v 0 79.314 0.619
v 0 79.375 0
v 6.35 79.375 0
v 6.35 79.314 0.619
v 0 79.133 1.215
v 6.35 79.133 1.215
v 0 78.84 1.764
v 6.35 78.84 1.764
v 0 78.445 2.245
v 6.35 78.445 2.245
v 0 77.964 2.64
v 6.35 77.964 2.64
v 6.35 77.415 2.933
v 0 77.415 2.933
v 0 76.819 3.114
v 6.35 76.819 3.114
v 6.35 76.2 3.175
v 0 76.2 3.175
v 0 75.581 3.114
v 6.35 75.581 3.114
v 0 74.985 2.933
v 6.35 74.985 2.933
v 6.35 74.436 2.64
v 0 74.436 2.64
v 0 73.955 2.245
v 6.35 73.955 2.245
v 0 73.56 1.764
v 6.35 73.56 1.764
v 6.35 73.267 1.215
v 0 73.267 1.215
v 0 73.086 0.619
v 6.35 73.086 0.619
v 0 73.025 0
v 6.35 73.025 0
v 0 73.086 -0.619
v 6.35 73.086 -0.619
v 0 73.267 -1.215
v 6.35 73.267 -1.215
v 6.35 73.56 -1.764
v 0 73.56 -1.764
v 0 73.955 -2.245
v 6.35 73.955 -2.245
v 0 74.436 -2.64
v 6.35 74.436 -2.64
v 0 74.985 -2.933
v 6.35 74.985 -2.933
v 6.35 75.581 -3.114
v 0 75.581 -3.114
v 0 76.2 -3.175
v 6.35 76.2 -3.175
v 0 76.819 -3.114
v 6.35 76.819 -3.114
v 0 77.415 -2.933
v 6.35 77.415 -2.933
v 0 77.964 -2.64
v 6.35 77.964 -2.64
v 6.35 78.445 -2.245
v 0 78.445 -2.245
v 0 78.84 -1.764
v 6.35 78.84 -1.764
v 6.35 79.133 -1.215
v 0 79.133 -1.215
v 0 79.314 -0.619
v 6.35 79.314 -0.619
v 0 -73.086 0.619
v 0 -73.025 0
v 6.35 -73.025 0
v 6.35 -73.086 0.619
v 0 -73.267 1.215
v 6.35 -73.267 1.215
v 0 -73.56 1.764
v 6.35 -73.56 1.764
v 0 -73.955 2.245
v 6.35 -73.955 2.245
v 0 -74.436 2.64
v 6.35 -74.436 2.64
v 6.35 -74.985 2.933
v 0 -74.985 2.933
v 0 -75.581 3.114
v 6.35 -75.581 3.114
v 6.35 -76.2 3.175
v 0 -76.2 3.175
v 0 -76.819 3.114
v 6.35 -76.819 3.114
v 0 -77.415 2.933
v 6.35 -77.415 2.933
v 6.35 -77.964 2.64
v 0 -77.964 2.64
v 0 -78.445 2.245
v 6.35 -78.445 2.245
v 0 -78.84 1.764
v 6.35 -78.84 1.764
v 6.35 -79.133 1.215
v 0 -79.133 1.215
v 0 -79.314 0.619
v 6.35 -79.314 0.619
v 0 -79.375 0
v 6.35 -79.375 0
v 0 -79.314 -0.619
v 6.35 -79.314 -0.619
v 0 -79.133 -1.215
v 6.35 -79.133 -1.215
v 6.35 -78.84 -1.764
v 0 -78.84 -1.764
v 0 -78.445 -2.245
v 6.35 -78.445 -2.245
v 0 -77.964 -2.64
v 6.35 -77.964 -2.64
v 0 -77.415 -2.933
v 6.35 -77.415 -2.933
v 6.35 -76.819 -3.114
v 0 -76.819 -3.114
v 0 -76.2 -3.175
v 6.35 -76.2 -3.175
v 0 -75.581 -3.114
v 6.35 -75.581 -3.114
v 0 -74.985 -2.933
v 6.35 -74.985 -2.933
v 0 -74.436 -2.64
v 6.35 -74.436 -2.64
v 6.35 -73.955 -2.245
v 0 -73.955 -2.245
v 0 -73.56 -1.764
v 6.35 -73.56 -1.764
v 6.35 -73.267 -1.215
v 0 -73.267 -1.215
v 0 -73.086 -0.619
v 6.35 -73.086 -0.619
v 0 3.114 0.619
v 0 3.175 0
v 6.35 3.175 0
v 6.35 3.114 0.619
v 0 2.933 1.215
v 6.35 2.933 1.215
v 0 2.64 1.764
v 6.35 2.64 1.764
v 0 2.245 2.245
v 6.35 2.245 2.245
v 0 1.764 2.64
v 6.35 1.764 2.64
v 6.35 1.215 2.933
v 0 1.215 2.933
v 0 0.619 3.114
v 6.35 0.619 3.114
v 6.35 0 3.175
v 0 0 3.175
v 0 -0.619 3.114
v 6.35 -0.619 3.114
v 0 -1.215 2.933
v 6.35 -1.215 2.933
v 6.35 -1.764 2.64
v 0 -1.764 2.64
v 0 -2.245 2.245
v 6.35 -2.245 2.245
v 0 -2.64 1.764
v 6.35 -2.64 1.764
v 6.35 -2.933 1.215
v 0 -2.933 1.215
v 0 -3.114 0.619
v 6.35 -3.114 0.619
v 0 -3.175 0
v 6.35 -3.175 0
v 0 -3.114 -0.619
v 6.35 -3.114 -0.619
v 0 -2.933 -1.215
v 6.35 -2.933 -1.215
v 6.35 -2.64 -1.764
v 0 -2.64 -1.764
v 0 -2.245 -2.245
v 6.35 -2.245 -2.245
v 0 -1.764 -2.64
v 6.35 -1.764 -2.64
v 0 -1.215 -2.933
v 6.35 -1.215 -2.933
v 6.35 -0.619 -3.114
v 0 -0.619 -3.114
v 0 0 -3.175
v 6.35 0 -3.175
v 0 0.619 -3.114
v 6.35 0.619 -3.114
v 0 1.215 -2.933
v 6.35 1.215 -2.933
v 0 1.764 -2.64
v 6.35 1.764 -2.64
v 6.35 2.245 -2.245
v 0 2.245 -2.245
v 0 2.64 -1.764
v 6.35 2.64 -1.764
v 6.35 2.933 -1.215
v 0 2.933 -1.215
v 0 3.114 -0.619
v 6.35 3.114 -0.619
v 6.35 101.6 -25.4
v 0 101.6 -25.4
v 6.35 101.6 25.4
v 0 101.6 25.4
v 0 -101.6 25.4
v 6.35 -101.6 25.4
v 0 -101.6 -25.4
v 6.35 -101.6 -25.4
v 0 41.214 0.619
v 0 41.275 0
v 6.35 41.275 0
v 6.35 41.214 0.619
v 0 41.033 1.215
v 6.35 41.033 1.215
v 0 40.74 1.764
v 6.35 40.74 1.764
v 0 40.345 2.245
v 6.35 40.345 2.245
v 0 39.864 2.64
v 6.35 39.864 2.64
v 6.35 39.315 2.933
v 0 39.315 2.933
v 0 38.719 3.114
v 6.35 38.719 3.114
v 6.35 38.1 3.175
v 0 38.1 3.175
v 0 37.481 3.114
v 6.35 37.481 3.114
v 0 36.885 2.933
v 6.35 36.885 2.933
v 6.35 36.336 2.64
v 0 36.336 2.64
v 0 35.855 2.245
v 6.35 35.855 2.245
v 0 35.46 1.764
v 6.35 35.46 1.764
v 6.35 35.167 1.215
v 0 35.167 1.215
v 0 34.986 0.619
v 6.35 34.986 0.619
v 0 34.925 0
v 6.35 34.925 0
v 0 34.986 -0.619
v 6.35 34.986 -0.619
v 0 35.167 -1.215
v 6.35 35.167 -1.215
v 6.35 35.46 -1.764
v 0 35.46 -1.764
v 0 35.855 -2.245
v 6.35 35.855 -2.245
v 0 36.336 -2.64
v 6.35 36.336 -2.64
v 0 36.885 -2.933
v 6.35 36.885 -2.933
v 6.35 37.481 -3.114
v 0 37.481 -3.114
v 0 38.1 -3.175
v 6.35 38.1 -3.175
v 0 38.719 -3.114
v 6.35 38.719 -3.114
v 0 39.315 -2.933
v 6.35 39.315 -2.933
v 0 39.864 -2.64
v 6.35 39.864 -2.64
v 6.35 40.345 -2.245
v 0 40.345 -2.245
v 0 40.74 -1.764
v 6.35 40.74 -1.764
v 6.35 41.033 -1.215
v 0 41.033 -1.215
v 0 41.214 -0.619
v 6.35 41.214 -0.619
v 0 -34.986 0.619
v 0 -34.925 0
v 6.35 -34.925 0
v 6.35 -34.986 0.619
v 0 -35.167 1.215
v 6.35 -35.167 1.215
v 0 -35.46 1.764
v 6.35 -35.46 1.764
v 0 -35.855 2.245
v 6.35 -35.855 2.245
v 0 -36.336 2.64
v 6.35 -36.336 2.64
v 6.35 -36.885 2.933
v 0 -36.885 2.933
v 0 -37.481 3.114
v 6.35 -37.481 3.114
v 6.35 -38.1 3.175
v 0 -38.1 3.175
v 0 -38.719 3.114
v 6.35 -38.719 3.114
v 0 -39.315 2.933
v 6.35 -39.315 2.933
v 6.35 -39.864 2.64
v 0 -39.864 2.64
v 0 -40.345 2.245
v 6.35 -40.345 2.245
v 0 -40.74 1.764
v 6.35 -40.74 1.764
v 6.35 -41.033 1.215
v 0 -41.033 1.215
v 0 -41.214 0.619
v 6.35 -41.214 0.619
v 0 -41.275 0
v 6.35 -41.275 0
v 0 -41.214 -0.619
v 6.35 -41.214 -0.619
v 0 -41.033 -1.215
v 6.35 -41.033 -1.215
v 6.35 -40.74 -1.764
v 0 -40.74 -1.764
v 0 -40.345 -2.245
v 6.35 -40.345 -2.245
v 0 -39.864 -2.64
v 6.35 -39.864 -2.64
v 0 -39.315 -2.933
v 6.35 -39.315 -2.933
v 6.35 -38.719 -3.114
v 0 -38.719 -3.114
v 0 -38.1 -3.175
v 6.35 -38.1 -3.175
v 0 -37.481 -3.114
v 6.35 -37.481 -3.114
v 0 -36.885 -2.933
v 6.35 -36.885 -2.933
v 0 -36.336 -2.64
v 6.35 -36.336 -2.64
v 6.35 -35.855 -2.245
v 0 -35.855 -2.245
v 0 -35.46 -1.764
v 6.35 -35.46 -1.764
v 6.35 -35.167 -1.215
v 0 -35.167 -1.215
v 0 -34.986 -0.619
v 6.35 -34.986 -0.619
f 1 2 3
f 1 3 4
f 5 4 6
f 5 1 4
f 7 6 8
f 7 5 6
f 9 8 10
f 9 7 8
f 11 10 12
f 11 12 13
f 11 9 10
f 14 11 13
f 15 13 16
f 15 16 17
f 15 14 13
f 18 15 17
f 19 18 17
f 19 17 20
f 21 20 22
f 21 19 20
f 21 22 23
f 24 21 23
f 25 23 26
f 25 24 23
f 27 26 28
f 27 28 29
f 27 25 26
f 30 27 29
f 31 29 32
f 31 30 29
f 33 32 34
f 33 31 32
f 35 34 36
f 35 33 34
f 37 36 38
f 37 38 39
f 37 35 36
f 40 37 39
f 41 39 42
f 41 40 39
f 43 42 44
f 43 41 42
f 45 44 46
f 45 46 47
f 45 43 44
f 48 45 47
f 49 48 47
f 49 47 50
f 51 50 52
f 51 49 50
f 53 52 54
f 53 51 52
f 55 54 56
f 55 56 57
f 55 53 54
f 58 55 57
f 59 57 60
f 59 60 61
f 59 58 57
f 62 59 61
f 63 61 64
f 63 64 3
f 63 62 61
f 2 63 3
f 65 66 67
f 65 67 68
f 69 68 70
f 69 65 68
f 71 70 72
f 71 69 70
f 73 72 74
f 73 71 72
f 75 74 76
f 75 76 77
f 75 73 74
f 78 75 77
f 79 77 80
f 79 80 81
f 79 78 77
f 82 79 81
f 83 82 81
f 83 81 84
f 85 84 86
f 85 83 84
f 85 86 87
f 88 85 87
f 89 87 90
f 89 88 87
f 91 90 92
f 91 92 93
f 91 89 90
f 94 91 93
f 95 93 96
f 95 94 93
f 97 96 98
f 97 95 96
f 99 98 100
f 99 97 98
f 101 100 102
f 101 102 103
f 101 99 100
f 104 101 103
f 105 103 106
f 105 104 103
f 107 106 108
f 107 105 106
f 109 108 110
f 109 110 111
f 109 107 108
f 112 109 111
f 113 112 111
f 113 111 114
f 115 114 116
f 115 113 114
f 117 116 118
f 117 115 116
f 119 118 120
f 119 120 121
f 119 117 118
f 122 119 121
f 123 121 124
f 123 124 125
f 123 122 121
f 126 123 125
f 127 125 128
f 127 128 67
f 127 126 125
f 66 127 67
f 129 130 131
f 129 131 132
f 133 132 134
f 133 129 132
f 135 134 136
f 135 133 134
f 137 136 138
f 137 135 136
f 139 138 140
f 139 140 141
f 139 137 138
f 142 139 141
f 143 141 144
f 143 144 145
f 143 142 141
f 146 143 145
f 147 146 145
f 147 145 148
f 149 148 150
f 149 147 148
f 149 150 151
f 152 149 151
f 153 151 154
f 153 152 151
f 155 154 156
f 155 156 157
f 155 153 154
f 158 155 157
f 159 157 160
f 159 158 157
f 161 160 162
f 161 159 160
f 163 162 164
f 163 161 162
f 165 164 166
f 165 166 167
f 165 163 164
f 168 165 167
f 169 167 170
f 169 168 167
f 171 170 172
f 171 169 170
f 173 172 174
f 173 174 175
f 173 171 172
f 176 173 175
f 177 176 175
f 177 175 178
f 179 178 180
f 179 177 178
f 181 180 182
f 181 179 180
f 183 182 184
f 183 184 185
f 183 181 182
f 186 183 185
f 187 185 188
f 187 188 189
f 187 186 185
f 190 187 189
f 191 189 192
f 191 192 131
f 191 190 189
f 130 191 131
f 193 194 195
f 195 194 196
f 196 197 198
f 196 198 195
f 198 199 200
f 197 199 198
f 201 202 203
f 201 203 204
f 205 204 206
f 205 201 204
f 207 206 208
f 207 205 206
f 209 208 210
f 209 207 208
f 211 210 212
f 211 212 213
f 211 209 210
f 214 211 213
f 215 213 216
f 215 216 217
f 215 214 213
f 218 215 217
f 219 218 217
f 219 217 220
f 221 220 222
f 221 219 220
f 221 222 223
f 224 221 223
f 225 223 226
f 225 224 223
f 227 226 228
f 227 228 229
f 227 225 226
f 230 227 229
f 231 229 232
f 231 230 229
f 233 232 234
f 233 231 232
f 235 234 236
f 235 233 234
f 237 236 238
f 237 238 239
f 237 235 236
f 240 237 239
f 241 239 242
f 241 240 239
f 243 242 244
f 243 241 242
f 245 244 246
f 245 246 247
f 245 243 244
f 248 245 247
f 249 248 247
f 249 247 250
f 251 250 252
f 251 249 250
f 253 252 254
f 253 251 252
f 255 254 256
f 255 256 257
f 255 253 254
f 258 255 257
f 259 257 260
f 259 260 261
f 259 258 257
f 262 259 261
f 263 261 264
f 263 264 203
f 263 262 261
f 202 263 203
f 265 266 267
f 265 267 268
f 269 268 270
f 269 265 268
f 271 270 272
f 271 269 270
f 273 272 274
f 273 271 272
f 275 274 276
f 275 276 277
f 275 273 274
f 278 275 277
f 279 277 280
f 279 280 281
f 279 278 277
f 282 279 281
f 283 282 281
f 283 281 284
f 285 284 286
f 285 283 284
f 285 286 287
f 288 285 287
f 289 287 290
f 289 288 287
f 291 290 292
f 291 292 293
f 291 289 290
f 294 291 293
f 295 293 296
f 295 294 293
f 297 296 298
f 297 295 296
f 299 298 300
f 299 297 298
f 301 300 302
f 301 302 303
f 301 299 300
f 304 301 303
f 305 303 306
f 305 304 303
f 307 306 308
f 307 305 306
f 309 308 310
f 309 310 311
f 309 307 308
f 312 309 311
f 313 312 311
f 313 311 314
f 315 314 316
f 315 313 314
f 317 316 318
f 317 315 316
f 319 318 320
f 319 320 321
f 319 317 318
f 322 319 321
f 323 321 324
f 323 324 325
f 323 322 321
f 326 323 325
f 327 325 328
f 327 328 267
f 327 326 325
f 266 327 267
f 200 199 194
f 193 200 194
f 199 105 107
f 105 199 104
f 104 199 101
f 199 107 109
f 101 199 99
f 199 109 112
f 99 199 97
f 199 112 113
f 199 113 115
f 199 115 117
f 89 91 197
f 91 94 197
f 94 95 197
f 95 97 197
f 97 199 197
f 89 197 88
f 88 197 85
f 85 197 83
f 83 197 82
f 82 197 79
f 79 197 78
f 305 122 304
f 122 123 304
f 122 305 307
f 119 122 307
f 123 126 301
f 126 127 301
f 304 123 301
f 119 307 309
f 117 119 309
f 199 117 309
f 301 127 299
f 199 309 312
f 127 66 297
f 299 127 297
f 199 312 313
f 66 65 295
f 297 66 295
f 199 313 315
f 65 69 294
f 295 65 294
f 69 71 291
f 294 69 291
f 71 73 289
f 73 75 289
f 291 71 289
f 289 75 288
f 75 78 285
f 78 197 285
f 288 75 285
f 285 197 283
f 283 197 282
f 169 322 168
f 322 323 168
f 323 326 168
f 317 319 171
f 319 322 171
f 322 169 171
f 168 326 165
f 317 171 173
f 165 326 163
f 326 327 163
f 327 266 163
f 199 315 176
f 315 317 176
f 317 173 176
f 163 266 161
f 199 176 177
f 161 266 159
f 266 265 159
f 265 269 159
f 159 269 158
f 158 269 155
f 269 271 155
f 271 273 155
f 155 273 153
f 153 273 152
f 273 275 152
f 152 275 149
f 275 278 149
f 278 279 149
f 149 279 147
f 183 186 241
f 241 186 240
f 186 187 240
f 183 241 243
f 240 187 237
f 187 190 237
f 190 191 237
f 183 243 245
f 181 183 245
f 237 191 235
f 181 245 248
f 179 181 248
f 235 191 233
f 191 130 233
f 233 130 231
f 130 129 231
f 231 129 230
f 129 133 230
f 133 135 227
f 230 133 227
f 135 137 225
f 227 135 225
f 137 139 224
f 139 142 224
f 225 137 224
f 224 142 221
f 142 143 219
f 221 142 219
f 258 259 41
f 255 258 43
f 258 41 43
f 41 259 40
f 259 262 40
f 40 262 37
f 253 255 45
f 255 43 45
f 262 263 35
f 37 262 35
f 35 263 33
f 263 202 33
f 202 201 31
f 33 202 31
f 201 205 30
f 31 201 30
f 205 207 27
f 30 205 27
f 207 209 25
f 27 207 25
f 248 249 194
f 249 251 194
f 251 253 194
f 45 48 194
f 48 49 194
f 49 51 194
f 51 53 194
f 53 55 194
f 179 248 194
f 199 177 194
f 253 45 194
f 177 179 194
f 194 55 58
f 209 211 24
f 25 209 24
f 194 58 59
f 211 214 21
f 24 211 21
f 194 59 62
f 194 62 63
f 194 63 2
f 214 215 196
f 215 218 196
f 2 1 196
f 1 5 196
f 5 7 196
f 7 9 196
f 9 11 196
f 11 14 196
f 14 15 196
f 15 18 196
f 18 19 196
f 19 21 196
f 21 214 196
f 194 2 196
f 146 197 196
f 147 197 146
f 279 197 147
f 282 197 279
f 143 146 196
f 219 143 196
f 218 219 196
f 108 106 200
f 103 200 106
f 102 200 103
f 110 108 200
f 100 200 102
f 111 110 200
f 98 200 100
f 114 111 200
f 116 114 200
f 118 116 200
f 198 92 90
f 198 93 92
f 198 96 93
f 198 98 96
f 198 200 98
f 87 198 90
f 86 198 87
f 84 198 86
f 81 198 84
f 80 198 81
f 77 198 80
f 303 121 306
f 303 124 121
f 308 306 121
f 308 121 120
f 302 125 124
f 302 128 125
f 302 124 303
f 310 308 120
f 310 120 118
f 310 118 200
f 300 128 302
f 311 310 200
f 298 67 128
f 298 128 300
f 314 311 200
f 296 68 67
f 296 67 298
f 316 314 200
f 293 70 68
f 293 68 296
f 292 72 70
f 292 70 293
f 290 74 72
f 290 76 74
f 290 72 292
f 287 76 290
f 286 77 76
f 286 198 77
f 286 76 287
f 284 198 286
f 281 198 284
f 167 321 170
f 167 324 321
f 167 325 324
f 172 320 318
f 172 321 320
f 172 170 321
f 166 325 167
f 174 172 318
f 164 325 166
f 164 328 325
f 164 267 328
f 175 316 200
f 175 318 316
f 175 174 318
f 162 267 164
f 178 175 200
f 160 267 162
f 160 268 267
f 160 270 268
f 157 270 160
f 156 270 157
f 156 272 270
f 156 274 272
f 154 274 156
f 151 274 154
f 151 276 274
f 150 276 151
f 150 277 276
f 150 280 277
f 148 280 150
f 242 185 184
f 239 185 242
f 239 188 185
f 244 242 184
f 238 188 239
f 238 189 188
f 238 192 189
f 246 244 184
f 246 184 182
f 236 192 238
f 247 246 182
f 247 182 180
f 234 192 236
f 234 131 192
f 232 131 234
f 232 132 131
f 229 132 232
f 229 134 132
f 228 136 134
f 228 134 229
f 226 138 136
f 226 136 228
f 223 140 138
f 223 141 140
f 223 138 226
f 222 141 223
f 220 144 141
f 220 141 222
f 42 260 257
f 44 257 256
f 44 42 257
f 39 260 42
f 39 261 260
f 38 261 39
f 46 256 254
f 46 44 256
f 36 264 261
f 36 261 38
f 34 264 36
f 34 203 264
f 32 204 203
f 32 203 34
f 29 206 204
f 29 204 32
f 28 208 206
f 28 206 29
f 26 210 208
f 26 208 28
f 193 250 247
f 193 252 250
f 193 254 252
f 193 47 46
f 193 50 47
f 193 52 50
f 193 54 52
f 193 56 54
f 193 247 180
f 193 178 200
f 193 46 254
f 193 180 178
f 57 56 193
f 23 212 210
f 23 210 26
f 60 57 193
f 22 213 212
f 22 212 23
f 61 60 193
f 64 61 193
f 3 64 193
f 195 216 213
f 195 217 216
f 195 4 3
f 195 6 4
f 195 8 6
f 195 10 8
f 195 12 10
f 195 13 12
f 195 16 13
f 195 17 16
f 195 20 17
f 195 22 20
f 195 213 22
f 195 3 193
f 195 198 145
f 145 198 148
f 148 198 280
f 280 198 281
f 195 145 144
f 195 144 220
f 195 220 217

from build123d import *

# Parameters (mm, degrees)
F0_W     = 203.2
F0_H     = 50.8
F0_R     = 3.175
F1_DEPTH = 6.35


with BuildPart() as f1:
    # F0 (on Right) → F1 (new body)
    with BuildSketch(Plane.YZ):
        Rectangle(F0_W, F0_H)
        with Locations((-76.2, 0)):
            Circle(F0_R, mode=Mode.SUBTRACT)
        with Locations((-38.1, 0)):
            Circle(F0_R, mode=Mode.SUBTRACT)
        Circle(F0_R, mode=Mode.SUBTRACT)
        with Locations((38.1, 0)):
            Circle(F0_R, mode=Mode.SUBTRACT)
        with Locations((76.2, 0)):
            Circle(F0_R, mode=Mode.SUBTRACT)
    extrude(amount=F1_DEPTH)


solid = f1.part
